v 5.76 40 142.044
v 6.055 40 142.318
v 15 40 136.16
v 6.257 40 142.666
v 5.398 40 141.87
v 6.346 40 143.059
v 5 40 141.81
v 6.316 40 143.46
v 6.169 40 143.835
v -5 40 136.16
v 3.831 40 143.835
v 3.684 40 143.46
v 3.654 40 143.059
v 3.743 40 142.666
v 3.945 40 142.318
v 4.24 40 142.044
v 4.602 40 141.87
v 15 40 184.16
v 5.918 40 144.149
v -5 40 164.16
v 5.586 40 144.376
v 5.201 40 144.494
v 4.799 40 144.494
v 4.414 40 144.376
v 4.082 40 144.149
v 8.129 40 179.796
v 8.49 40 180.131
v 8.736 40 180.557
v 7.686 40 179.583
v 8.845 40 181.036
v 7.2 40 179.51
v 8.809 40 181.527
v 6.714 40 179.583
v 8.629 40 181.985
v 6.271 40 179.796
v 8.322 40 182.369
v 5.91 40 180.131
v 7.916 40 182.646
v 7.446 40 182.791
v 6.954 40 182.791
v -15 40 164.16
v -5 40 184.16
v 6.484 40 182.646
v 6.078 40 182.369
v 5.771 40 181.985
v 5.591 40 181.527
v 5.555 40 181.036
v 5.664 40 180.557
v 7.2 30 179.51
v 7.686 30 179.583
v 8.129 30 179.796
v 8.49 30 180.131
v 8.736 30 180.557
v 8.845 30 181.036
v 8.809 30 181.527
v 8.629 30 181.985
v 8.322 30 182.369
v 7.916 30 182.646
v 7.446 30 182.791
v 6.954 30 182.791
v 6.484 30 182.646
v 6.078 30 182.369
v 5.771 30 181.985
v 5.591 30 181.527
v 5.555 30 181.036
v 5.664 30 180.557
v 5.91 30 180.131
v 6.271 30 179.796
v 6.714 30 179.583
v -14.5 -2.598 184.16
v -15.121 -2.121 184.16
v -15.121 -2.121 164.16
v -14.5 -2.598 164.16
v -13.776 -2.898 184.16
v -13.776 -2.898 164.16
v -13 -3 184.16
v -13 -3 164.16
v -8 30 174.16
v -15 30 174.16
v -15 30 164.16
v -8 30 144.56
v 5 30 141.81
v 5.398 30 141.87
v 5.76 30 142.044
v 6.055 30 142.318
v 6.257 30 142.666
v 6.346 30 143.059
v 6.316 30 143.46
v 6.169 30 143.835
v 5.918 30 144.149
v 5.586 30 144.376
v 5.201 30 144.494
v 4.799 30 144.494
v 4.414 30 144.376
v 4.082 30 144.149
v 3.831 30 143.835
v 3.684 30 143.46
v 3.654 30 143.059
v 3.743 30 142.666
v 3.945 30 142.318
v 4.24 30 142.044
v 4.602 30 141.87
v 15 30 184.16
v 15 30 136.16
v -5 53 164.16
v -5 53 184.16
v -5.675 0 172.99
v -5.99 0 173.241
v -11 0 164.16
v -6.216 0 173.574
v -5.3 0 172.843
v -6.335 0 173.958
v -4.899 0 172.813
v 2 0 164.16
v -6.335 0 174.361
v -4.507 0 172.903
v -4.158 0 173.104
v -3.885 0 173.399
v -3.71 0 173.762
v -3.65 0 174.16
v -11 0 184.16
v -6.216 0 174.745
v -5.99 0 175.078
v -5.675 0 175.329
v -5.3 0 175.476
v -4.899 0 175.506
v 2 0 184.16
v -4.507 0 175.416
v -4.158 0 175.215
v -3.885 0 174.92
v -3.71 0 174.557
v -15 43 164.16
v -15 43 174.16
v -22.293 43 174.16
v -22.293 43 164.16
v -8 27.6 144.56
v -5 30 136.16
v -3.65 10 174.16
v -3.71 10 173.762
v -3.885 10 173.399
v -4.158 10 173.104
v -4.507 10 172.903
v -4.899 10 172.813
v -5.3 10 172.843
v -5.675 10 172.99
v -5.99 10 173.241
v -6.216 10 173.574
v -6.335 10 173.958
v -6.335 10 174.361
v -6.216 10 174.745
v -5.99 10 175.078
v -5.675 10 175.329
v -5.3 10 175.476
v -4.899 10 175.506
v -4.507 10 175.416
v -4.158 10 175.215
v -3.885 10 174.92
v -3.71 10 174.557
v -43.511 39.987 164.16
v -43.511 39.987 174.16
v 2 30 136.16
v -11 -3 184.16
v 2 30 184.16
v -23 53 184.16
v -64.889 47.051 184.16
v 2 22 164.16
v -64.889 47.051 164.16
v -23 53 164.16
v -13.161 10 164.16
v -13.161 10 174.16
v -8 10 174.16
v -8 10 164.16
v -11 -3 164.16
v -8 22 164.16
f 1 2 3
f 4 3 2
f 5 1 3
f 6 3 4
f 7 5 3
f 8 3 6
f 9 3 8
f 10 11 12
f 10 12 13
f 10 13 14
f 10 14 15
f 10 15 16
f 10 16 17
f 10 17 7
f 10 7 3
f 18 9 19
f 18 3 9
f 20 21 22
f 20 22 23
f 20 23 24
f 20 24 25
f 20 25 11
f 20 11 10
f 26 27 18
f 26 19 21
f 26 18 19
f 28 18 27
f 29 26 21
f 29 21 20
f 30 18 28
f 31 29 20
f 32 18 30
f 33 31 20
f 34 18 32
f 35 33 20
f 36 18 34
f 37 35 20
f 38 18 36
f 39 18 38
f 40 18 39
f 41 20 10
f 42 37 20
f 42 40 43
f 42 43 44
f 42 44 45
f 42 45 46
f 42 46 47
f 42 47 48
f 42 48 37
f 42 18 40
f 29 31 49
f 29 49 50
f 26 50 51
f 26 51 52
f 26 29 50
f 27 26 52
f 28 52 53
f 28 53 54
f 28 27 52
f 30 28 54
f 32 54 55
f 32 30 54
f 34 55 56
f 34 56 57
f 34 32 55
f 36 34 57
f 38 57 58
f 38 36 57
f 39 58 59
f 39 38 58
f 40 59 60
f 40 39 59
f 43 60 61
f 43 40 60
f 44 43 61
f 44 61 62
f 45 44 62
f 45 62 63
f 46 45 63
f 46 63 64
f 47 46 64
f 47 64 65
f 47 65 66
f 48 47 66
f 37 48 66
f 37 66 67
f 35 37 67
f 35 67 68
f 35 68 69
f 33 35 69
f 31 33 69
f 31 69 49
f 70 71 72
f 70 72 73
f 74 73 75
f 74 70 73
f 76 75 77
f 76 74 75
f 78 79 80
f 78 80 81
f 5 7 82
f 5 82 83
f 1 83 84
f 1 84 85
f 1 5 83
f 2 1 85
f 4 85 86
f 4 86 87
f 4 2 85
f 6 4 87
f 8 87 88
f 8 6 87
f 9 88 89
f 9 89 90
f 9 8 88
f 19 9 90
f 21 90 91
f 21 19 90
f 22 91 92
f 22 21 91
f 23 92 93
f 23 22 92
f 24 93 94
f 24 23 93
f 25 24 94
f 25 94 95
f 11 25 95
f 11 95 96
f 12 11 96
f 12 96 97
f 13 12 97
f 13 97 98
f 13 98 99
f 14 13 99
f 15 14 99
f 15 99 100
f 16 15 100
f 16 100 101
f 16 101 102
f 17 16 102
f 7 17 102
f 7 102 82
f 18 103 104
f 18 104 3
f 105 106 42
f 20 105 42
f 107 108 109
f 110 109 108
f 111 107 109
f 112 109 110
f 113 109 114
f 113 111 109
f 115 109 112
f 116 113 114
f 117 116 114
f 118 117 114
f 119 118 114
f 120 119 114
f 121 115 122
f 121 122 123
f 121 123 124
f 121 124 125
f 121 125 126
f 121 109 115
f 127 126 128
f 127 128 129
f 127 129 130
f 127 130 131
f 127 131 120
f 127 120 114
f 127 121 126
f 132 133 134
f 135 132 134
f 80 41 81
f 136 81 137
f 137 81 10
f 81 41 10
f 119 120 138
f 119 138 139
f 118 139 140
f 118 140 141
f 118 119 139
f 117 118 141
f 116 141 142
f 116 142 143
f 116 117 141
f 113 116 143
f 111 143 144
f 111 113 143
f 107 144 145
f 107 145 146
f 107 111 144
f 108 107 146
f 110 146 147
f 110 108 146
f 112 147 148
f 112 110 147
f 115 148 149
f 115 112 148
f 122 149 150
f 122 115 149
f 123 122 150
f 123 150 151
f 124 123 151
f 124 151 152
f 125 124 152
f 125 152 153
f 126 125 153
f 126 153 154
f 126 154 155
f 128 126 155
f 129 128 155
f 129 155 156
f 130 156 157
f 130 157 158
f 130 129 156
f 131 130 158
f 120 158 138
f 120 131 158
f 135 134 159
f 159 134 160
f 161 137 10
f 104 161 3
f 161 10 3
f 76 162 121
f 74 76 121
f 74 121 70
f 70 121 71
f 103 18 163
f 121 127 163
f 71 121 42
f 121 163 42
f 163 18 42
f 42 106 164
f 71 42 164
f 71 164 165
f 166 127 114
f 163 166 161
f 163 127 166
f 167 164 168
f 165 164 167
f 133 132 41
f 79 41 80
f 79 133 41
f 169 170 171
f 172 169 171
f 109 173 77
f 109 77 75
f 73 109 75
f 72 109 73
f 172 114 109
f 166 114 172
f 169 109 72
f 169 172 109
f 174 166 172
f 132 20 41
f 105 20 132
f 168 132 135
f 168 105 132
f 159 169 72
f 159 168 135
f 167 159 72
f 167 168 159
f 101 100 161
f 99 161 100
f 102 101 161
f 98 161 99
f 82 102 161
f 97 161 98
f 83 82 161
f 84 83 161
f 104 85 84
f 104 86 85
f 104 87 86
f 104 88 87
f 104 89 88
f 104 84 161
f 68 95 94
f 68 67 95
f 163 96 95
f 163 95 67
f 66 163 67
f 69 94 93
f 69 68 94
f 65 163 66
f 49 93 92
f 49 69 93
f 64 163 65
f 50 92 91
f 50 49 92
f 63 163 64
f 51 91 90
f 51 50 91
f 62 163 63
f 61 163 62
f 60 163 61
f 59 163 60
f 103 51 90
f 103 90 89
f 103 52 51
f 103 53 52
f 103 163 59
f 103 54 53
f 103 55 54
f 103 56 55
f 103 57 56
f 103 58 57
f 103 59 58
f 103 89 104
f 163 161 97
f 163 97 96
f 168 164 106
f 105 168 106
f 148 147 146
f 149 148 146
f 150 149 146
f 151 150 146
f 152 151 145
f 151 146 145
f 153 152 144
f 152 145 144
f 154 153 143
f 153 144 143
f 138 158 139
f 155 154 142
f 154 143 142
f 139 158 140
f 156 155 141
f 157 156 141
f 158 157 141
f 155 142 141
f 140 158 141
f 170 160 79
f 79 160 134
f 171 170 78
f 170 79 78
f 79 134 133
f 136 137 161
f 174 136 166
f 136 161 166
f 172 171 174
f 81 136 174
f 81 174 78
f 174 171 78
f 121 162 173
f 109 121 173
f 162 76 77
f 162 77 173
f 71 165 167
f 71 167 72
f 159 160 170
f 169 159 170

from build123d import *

# Parameters (mm, degrees)
EXTRUDE_1_DEPTH       = 172
SHELL_START           = 6
SHELL_1_DEPTH         = 160
SKETCH_2_W            = 36
SKETCH_2_H            = 16
CUT_EXTRUDE_1_DEPTH   = 74
EXTRUDE_2_DEPTH       = 2
SKETCH_4_R            = 10
CUT_EXTRUDE_2_DEPTH   = 186
SKETCH_5_R            = 1.5
CUT_EXTRUDE_3_DEPTH   = 10
EXTRUDE_3_DEPTH       = 172
SKETCH_7_W            = 36
SKETCH_7_H            = 16
CUT_EXTRUDE_4_DEPTH   = 172
SKETCH_8_W            = 6
SKETCH_8_H            = 172
CUT_EXTRUDE_5_DEPTH   = 3
EXTRUDE_4_DEPTH       = 15
CHAMFER_1_SIZE        = 15
CHAMFER_2_SIZE        = 15
CHAMFER_3_SIZE        = 8
SKETCH_10_R           = 1.35
CUT_EXTRUDE_6_DEPTH   = 15
SKETCH_12_R           = 1.35
CUT_EXTRUDE_7_DEPTH   = 15
SKETCH_14_OUTSIDE_W   = 213.548
SKETCH_14_OUTSIDE_H   = 97.548
SKETCH_14_OUTSIDE_W_2 = 15
SKETCH_14_OUTSIDE_H_2 = 56
CUT_EXTRUDE_8_DEPTH   = 82.5
EXTRUDE_5_DEPTH       = 15
CUT_EXTRUDE_9_DEPTH   = 15
SKETCH_17_W           = 13
SKETCH_17_H           = 5
EXTRUDE_6_DEPTH       = 15
EXTRUDE_7_DEPTH       = 20
SHELL_START_2         = 78.159554327
SHELL_2_DEPTH         = 10
EXTRUDE_8_DEPTH       = 28
CUT_EXTRUDE_10_DEPTH  = 20
CUT_EXTRUDE_11_DEPTH  = 20
SKETCH_23_R           = 1.65
SKETCH_23_R_2         = 1.35
CUT_EXTRUDE_12_DEPTH  = 22
SKETCH_26_R           = 1.35
CUT_EXTRUDE_14_DEPTH  = 10
CUT_EXTRUDE_15_DEPTH  = 82.5


# Read off the part's stored shape, not the designer's step: 抽壳1, 抽壳2
with BuildPart() as part:
    # 草图1 → 凸台-拉伸1 (new body)
    with BuildSketch(Plane.XY):
        with BuildLine():
            Line((0, 0), (0, 40))
            Line((0, 40), (-5, 40))
            Line((-5, 40), (-5, 53))
            Line((-5, 53), (-23, 53))
            Line((-23, 53), (-64.888578151, 47.050698608))
            Line((-64.888578151, 47.050698608), (-15.121320344, -2.121320344))
            ThreePointArc((-15.121320344, -2.121320344), (-14.148050297, -2.771638598), (-13, -3))
            Line((-13, -3), (-5, -3))
            Line((-5, -3), (-5, 0))
            Line((-5, 0), (0, 0))
        make_face()
    extrude(amount=EXTRUDE_1_DEPTH)

    # 抽壳1 outline → 抽壳1 (cut)
    with BuildSketch(Plane.XY.offset(SHELL_START)):
        Polygon((-11, 6), (-6, 6), (-6, 34), (-11, 34), (-11, 47), (-22.576046832, 47), (-52.061983815, 42.812206246), (-11.767841448, 3), (-11, 3), align=None)
    extrude(amount=SHELL_1_DEPTH, mode=Mode.SUBTRACT)

    # 草图2 → 切除-拉伸1 (cut)
    with BuildSketch(Plane(origin=(0, 0, 0), x_dir=(0, 0, -1), z_dir=(1, 0, 0))):
        with Locations((-136, 10)):
            Rectangle(SKETCH_2_W, SKETCH_2_H)
        with Locations((-36, 10)):
            Rectangle(SKETCH_2_W, SKETCH_2_H)
    extrude(amount=-CUT_EXTRUDE_1_DEPTH, mode=Mode.SUBTRACT)

    # 草图3 → 凸台-拉伸2 (add, symmetric)
    with BuildSketch(Plane(origin=(0, 0, 86), x_dir=(-1, 0, 0), z_dir=(0, 0, -1))):
        Polygon((5, 53), (5, 40), (0, 40), (0, 0), (5, 0), (5, -3), (13, -3), (16.579355858, -0.680723591), (64.888578151, 47.050698608), (23, 53), align=None)
    extrude(amount=EXTRUDE_2_DEPTH, both=True)

    # 草图4 → 切除-拉伸2 (cut)
    with BuildSketch(Plane.XY.offset(172)):
        with Locations((-15, 21.071297481)):
            Circle(SKETCH_4_R)
    extrude(amount=-CUT_EXTRUDE_2_DEPTH, mode=Mode.SUBTRACT)

    # 草图5 → 切除-拉伸3 (cut)
    with BuildSketch(Plane(origin=(0, 53, 0), x_dir=(1, 0, 0), z_dir=(0, 1, 0))):
        with Locations(Location((-13.338195438, -63.5, 0), (0, 0, 270))):
            Circle(SKETCH_5_R)
        with Locations(Location((-13.338195438, -108.5, 0), (0, 0, 270))):
            Circle(SKETCH_5_R)
    extrude(amount=-CUT_EXTRUDE_3_DEPTH, mode=Mode.SUBTRACT)

    # 草图6 → 凸台-拉伸3 (add)
    with BuildSketch(Plane.XY.offset(172)):
        Polygon((-11, 6), (-14.804157153, 6), (-11.767841448, 3), (-11, 3), align=None)
    extrude(amount=-EXTRUDE_3_DEPTH)

    # 草图7 → 切除-拉伸4 (cut)
    with BuildSketch(Plane(origin=(0, 0, 0), x_dir=(0, 0, -1), z_dir=(1, 0, 0))):
        with Locations((-136, 10)):
            Rectangle(SKETCH_7_W, SKETCH_7_H)
        with Locations((-36, 10)):
            Rectangle(SKETCH_7_W, SKETCH_7_H)
    extrude(amount=-CUT_EXTRUDE_4_DEPTH, mode=Mode.SUBTRACT)

    # 草图8 → 切除-拉伸5 (cut)
    with BuildSketch(Plane.XZ.offset(3)):
        with Locations((-8, 86)):
            Rectangle(SKETCH_8_W, SKETCH_8_H)
    extrude(amount=-CUT_EXTRUDE_5_DEPTH, mode=Mode.SUBTRACT)

    # 草图9 → 凸台-拉伸4 (add)
    with BuildSketch(Plane(origin=(0, 0, 0), x_dir=(0, 0, -1), z_dir=(1, 0, 0))):
        Polygon((-86, 40), (-151, 40), (-151, 35), (-86, 35), (-21, 35), (-21, 40), align=None)
    extrude(amount=EXTRUDE_4_DEPTH)

    # 倒角1
    chamfer_1_edges = [part.edges().sort_by_distance(p)[0] for p in [
        (15, 37.5, 151),
    ]]
    chamfer(chamfer_1_edges, length=CHAMFER_1_SIZE - 0.0001)  # a hair under: the kernel refuses the full size

    # 倒角2
    chamfer_2_edges = [part.edges().sort_by_distance(p)[0] for p in [
        (15, 37.5, 21),
    ]]
    chamfer(chamfer_2_edges, length=CHAMFER_2_SIZE - 0.0001)  # a hair under: the kernel refuses the full size

    # 倒角3
    chamfer_3_edges = [part.edges().sort_by_distance(p)[0] for p in [
        (0, 35, 86),
    ]]
    chamfer(chamfer_3_edges, length=CHAMFER_3_SIZE)

    # 草图10 → 切除-拉伸6 (cut)
    with BuildSketch(Plane.XZ):
        with Locations((-5, 158)):
            Circle(SKETCH_10_R)
        with Locations((-5, 111)):
            Circle(SKETCH_10_R)
        with Locations((-5, 61)):
            Circle(SKETCH_10_R)
        with Locations((-5, 14.01360213)):
            Circle(SKETCH_10_R)
    extrude(amount=-CUT_EXTRUDE_6_DEPTH, mode=Mode.SUBTRACT)

    # 草图12 → 切除-拉伸7 (cut)
    with BuildSketch(Plane(origin=(0, 40, 0), x_dir=(1, 0, 0), z_dir=(0, 1, 0))):
        with Locations(Location((5, -41, 0), (0, 0, 270))):
            Circle(SKETCH_12_R)
        with Locations(Location((5, -86, 0), (0, 0, 270))):
            Circle(SKETCH_12_R)
        with Locations(Location((5, -131, 0), (0, 0, 270))):
            Circle(SKETCH_12_R)
    extrude(amount=-CUT_EXTRUDE_7_DEPTH, mode=Mode.SUBTRACT)

    # 草图14 outside → 切除-拉伸8 (cut, symmetric)
    with BuildSketch(Plane(origin=(0, 0, 0), x_dir=(0, 0, -1), z_dir=(1, 0, 0))):
        with Locations((-86, 25)):
            Rectangle(SKETCH_14_OUTSIDE_W, SKETCH_14_OUTSIDE_H)
        with Locations((-75.659554327, 25)):
            Rectangle(SKETCH_14_OUTSIDE_W_2, SKETCH_14_OUTSIDE_H_2, mode=Mode.SUBTRACT)
    extrude(amount=CUT_EXTRUDE_8_DEPTH, both=True, mode=Mode.SUBTRACT)

    # 草图15 → 凸台-拉伸5 (add)
    with BuildSketch(Plane(origin=(0, 0, 68.159554327), x_dir=(-1, 0, 0), z_dir=(0, 0, -1))):
        Polygon((0, 0), (-2, 0), (-2, 29), (0, 27), align=None)
    extrude(amount=-EXTRUDE_5_DEPTH)

    # 草图16 → 切除-拉伸9 (cut)
    with BuildSketch(Plane(origin=(0, 0, 68.159554327), x_dir=(-1, 0, 0), z_dir=(0, 0, -1))):
        Polygon((-2, 29), (-2, 35), (-8, 35), align=None)
    extrude(amount=-CUT_EXTRUDE_9_DEPTH, mode=Mode.SUBTRACT)

    # 草图17 → 凸台-拉伸6 (add)
    with BuildSketch(Plane(origin=(0, 0, 68.159554327), x_dir=(-1, 0, 0), z_dir=(0, 0, -1))):
        with Locations((-8.5, 32.5)):
            Rectangle(SKETCH_17_W, SKETCH_17_H)
    extrude(amount=-EXTRUDE_6_DEPTH)

    # 草图18 → 凸台-拉伸7 (add)
    with BuildSketch(Plane(origin=(0, 0, 68.159554327), x_dir=(-1, 0, 0), z_dir=(0, 0, -1))):
        with BuildLine():
            Line((-15, 40), (-15, 30))
            Line((-15, 30), (-2, 30))
            Line((-2, 30), (-2, 0))
            Line((-2, 0), (11, 0))
            Line((11, 0), (11, -3))
            Line((11, -3), (13, -3))
            ThreePointArc((13, -3), (14.148050297, -2.771638598), (15.121320344, -2.121320344))
            Line((15.121320344, -2.121320344), (64.888578151, 47.050698608))
            Line((64.888578151, 47.050698608), (23, 53))
            Line((23, 53), (5, 53))
            Line((5, 53), (5, 40))
            Line((5, 40), (-15, 40))
        make_face()
    extrude(amount=-EXTRUDE_7_DEPTH)

    # 抽壳2 outline → 抽壳2 (cut)
    with BuildSketch(Plane.XY.offset(SHELL_START_2)):
        Polygon((-8, 30), (-15, 30), (-15, 43), (-22.293411387, 43), (-43.510920925, 39.986544671), (-13.161382076, 10), (-8, 10), align=None)
    extrude(amount=SHELL_2_DEPTH, mode=Mode.SUBTRACT)

    # 草图20 → 凸台-拉伸8 (add)
    with BuildSketch(Plane.XY.offset(88.159554327)):
        Polygon((15, 40), (-15, 40), (-15, 30), (-8, 30), (-8, 22), (2, 22), (2, 30), (15, 30), align=None)
    extrude(amount=EXTRUDE_8_DEPTH)

    # 草图21 → 切除-拉伸10 (cut)
    with BuildSketch(Plane(origin=(2, 0, 0), x_dir=(0, 0, -1), z_dir=(1, 0, 0))):
        Polygon((-116.159554327, 30), (-88.159554327, 22), (-116.159554327, 22), align=None)
    extrude(amount=-CUT_EXTRUDE_10_DEPTH, mode=Mode.SUBTRACT)

    # 草图22 → 切除-拉伸11 (cut)
    with BuildSketch(Plane(origin=(0, 40, 0), x_dir=(1, 0, 0), z_dir=(0, 1, 0))):
        Polygon((-8, -116.159554327), (-15, -116.159554327), (-15, -88.159554327), (-5, -116.159554327), align=None)
    extrude(amount=-CUT_EXTRUDE_11_DEPTH, mode=Mode.SUBTRACT)

    # 草图23 → 切除-拉伸12 (cut)
    with BuildSketch(Plane(origin=(0, 40, 0), x_dir=(1, 0, 0), z_dir=(0, 1, 0))):
        with Locations(Location((7.2, -71.159554327, 0), (0, 0, 270))):
            Circle(SKETCH_23_R)
        with Locations(Location((5, -109.159554327, 0), (0, 0, 270))):
            Circle(SKETCH_23_R_2)
    extrude(amount=-CUT_EXTRUDE_12_DEPTH, mode=Mode.SUBTRACT)

    # 草图26 → 切除-拉伸14 (cut)
    with BuildSketch(Plane.XZ):
        with Locations((-5, 78.159554327)):
            Circle(SKETCH_26_R)
    extrude(amount=-CUT_EXTRUDE_14_DEPTH, mode=Mode.SUBTRACT)


with BuildPart() as body_2:
    # 镜向2: mirrored copy
    add(part.part.mirror(Plane.XY.offset(126.159554327)))


with BuildPart() as part_1:
    add(part.part)

    # 草图27 → 切除-拉伸15 (cut, symmetric)
    with BuildSketch(Plane(origin=(0, 40, 0), x_dir=(1, 0, 0), z_dir=(0, 1, 0))):
        Polygon((-70.30444709, -126.427743847), (59.164340296, -124.069061785), (93.545633321, -94.969295867), (93.545633321, -36.488882893), (-105.077867855, -19.264077709), (-117.933649563, -88.897060516), align=None)
    extrude(amount=CUT_EXTRUDE_15_DEPTH, both=True, mode=Mode.SUBTRACT)


solid = body_2.part
